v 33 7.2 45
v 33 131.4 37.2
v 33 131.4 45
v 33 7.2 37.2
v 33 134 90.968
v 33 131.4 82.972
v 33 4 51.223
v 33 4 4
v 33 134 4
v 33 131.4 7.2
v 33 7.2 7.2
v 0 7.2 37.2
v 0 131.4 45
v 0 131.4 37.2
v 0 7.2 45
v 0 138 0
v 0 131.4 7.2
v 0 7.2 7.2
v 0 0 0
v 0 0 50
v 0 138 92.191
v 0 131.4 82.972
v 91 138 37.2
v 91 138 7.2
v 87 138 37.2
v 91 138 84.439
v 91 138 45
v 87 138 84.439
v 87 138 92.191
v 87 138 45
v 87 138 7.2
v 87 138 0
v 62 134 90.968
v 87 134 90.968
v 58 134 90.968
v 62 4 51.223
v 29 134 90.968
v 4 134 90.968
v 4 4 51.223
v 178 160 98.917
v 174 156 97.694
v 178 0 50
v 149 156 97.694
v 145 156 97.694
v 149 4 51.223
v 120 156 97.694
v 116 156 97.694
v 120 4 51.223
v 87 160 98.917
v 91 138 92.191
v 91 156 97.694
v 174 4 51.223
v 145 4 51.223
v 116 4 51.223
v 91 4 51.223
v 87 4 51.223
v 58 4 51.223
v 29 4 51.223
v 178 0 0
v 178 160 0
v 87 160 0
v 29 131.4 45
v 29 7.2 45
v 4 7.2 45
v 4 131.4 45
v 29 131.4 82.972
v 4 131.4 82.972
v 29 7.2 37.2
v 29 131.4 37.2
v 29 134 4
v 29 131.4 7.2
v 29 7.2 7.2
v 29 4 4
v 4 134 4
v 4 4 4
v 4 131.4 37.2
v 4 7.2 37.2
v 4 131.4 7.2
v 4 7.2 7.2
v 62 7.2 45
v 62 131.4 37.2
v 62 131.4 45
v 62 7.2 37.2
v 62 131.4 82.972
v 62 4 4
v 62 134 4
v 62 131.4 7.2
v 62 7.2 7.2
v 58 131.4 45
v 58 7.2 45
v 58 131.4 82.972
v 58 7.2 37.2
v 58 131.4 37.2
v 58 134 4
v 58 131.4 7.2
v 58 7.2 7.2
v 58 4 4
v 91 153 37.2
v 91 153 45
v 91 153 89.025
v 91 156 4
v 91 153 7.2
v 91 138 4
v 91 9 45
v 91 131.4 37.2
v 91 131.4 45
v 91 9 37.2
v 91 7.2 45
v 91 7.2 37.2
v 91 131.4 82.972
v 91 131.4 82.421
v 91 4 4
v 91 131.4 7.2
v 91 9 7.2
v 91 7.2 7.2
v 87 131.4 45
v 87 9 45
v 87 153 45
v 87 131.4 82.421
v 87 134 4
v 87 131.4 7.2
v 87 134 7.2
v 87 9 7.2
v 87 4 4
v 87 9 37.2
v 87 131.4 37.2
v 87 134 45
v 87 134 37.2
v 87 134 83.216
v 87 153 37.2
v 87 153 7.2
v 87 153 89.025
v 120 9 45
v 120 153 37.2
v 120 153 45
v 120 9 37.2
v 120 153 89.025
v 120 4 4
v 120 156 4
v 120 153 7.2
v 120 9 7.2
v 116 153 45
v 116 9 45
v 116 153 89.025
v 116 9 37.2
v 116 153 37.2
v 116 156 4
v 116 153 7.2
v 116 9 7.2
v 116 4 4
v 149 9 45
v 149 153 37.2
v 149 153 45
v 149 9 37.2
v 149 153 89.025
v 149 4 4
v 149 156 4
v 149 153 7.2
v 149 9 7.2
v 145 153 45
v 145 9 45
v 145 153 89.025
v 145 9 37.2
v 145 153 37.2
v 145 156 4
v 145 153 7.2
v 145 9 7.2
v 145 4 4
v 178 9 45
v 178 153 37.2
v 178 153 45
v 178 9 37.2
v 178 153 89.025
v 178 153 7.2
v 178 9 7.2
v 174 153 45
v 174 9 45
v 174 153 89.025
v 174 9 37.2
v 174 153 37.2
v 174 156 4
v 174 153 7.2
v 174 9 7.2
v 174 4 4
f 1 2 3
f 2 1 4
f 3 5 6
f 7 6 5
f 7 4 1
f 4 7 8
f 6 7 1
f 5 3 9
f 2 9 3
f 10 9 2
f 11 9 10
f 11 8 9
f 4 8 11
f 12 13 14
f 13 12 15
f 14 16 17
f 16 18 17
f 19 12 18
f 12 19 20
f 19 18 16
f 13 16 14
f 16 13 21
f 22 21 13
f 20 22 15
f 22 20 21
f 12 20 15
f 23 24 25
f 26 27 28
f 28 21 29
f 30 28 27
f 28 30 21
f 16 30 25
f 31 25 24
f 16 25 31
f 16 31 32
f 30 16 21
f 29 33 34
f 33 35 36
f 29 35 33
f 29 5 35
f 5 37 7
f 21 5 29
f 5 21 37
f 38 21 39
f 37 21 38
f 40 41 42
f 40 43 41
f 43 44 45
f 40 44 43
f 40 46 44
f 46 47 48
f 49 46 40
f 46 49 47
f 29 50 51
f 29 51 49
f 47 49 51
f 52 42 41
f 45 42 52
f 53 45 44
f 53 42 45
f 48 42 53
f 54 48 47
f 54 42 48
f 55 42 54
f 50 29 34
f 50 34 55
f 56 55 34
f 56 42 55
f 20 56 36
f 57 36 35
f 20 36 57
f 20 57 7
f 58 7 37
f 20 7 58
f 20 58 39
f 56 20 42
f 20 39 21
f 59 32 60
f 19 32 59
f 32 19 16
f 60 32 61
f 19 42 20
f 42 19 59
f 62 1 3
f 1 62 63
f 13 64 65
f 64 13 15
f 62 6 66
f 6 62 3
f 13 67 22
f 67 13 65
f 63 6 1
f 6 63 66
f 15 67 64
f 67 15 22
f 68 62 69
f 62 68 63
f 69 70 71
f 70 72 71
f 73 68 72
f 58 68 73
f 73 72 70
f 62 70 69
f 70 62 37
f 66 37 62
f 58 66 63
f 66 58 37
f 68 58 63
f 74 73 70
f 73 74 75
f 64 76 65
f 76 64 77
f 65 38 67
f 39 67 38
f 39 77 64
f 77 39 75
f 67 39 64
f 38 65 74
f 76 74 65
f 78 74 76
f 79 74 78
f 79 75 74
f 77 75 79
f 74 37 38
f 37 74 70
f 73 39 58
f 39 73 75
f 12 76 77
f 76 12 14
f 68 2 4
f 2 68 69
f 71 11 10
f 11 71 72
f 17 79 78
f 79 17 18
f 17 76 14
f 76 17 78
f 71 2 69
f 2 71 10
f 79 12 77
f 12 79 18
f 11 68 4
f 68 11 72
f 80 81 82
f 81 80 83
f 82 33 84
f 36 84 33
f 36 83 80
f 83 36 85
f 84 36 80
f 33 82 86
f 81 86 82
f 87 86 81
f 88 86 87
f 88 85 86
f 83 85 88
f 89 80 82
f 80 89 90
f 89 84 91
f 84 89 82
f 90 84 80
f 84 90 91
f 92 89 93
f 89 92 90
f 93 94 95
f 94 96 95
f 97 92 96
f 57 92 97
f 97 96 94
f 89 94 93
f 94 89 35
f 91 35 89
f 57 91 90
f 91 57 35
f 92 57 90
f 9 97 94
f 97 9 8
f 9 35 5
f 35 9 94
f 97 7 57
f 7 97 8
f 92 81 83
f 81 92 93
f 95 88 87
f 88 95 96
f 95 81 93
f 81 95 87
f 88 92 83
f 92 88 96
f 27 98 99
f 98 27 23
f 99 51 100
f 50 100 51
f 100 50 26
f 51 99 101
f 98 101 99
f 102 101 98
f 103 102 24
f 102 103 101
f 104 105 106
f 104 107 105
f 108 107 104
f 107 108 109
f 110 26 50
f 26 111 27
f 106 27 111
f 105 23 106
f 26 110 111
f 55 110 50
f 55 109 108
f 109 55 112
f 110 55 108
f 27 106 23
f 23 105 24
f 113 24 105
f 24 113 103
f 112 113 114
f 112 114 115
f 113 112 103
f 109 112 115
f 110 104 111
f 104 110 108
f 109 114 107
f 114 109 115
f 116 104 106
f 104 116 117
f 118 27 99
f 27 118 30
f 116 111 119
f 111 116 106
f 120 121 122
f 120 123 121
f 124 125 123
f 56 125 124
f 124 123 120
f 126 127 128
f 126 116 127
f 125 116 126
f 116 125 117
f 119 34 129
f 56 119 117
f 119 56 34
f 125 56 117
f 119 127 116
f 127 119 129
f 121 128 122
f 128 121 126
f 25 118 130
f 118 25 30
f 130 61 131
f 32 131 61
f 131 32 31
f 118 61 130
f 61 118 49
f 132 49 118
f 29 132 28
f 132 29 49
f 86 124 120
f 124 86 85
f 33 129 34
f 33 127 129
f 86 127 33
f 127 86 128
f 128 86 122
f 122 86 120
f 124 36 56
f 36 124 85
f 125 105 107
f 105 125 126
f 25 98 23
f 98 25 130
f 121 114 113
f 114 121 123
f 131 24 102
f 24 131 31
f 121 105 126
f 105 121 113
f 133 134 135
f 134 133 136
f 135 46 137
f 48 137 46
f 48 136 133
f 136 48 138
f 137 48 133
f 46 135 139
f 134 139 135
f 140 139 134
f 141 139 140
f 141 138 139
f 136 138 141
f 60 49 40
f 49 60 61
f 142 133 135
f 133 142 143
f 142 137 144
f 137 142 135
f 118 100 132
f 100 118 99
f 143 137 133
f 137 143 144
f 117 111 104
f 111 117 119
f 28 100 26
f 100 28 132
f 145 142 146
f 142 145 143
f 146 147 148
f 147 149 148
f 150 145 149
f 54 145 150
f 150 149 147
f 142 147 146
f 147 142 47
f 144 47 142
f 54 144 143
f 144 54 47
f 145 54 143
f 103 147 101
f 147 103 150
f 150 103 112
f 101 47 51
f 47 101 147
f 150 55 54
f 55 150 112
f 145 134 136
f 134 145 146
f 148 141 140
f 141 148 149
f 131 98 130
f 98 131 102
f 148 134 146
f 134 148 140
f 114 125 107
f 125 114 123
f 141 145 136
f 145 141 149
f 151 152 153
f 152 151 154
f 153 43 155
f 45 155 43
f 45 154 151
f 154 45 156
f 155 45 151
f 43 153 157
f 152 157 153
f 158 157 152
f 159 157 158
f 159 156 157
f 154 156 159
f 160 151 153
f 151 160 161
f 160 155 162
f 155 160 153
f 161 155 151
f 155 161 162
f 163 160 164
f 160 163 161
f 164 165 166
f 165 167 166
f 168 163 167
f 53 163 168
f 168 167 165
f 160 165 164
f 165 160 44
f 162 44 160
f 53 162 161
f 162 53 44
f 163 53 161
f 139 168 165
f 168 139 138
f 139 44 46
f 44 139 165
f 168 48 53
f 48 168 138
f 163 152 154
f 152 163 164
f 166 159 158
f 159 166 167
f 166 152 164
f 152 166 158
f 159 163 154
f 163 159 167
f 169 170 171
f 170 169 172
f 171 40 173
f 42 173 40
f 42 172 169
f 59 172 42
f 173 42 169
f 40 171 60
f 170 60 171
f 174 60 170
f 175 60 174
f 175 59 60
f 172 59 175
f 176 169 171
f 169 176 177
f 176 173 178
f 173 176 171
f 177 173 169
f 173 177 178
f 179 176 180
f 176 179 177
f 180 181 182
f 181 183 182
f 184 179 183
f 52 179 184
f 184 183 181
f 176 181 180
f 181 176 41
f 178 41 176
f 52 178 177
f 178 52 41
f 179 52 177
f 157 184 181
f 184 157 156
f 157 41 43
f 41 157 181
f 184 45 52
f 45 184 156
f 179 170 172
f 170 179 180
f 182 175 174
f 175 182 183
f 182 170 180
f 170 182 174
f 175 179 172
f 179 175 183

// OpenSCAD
//Sand Paper org

thickness = 4;
gap = 25;
paperParts = 3;
padParts = 3;

module paperTrianglePris(){
    difference(){
        cube([thickness*2 + gap, thickness*2 + 152, 50]);
        
        rotate([17, 0, 0])
        cube([thickness*2 + gap, thickness*2 + 200, 50]);
    }
}

module paperPart(){
    
    difference(){
        
        union(){
            cube([thickness*2 + gap, thickness*2 + 152, 50]);
            
            translate([0, 0, 50])
            paperTrianglePris();
        }
        
        //Slot
        union(){
            translate([thickness, thickness, thickness])
            cube([25, 152, 200]);
            
            scale([1, 0.9, 0.6])
            translate([0, 10, thickness*3])
            cube([thickness*2 + gap, thickness*2 + 152, 50]);
            
            scale([1, 0.9, 0.9])
            translate([0, 10, 50])
            paperTrianglePris();
        }
    }
}


module padTrianglePris(){
    difference(){
        cube([thickness*2 + gap, thickness*2 + 130, 50]);
        
        rotate([17, 0, 0])
        cube([thickness*2 + gap, thickness*2 + 200, 50]);
    }
}

module padPart(){
    
    difference(){
        
        union(){
            cube([thickness*2 + gap, thickness*2 + 130, 50]);
            
            translate([0, 0, 50])
            padTrianglePris();
        }
        
        //Slot
        union(){
            translate([thickness, thickness, thickness])
            cube([25, 130, 200]);
            
            scale([1, 0.9, 0.6])
            translate([0, 8, thickness*3])
            cube([thickness*2 + gap, thickness*2 + 130, 50]);
            
            scale([1, 0.9, 0.9])
            translate([0, 8, 50])
            padTrianglePris();
        }
    }
}





module main(){
    
    for (i = [0:2]){
        translate([i * (thickness + 25), 0, 0])
        padPart();
    }
    
    for (i = [3:5]){
        translate([i * (thickness + 25), 0, 0])
        paperPart();
    }
    
}main();
